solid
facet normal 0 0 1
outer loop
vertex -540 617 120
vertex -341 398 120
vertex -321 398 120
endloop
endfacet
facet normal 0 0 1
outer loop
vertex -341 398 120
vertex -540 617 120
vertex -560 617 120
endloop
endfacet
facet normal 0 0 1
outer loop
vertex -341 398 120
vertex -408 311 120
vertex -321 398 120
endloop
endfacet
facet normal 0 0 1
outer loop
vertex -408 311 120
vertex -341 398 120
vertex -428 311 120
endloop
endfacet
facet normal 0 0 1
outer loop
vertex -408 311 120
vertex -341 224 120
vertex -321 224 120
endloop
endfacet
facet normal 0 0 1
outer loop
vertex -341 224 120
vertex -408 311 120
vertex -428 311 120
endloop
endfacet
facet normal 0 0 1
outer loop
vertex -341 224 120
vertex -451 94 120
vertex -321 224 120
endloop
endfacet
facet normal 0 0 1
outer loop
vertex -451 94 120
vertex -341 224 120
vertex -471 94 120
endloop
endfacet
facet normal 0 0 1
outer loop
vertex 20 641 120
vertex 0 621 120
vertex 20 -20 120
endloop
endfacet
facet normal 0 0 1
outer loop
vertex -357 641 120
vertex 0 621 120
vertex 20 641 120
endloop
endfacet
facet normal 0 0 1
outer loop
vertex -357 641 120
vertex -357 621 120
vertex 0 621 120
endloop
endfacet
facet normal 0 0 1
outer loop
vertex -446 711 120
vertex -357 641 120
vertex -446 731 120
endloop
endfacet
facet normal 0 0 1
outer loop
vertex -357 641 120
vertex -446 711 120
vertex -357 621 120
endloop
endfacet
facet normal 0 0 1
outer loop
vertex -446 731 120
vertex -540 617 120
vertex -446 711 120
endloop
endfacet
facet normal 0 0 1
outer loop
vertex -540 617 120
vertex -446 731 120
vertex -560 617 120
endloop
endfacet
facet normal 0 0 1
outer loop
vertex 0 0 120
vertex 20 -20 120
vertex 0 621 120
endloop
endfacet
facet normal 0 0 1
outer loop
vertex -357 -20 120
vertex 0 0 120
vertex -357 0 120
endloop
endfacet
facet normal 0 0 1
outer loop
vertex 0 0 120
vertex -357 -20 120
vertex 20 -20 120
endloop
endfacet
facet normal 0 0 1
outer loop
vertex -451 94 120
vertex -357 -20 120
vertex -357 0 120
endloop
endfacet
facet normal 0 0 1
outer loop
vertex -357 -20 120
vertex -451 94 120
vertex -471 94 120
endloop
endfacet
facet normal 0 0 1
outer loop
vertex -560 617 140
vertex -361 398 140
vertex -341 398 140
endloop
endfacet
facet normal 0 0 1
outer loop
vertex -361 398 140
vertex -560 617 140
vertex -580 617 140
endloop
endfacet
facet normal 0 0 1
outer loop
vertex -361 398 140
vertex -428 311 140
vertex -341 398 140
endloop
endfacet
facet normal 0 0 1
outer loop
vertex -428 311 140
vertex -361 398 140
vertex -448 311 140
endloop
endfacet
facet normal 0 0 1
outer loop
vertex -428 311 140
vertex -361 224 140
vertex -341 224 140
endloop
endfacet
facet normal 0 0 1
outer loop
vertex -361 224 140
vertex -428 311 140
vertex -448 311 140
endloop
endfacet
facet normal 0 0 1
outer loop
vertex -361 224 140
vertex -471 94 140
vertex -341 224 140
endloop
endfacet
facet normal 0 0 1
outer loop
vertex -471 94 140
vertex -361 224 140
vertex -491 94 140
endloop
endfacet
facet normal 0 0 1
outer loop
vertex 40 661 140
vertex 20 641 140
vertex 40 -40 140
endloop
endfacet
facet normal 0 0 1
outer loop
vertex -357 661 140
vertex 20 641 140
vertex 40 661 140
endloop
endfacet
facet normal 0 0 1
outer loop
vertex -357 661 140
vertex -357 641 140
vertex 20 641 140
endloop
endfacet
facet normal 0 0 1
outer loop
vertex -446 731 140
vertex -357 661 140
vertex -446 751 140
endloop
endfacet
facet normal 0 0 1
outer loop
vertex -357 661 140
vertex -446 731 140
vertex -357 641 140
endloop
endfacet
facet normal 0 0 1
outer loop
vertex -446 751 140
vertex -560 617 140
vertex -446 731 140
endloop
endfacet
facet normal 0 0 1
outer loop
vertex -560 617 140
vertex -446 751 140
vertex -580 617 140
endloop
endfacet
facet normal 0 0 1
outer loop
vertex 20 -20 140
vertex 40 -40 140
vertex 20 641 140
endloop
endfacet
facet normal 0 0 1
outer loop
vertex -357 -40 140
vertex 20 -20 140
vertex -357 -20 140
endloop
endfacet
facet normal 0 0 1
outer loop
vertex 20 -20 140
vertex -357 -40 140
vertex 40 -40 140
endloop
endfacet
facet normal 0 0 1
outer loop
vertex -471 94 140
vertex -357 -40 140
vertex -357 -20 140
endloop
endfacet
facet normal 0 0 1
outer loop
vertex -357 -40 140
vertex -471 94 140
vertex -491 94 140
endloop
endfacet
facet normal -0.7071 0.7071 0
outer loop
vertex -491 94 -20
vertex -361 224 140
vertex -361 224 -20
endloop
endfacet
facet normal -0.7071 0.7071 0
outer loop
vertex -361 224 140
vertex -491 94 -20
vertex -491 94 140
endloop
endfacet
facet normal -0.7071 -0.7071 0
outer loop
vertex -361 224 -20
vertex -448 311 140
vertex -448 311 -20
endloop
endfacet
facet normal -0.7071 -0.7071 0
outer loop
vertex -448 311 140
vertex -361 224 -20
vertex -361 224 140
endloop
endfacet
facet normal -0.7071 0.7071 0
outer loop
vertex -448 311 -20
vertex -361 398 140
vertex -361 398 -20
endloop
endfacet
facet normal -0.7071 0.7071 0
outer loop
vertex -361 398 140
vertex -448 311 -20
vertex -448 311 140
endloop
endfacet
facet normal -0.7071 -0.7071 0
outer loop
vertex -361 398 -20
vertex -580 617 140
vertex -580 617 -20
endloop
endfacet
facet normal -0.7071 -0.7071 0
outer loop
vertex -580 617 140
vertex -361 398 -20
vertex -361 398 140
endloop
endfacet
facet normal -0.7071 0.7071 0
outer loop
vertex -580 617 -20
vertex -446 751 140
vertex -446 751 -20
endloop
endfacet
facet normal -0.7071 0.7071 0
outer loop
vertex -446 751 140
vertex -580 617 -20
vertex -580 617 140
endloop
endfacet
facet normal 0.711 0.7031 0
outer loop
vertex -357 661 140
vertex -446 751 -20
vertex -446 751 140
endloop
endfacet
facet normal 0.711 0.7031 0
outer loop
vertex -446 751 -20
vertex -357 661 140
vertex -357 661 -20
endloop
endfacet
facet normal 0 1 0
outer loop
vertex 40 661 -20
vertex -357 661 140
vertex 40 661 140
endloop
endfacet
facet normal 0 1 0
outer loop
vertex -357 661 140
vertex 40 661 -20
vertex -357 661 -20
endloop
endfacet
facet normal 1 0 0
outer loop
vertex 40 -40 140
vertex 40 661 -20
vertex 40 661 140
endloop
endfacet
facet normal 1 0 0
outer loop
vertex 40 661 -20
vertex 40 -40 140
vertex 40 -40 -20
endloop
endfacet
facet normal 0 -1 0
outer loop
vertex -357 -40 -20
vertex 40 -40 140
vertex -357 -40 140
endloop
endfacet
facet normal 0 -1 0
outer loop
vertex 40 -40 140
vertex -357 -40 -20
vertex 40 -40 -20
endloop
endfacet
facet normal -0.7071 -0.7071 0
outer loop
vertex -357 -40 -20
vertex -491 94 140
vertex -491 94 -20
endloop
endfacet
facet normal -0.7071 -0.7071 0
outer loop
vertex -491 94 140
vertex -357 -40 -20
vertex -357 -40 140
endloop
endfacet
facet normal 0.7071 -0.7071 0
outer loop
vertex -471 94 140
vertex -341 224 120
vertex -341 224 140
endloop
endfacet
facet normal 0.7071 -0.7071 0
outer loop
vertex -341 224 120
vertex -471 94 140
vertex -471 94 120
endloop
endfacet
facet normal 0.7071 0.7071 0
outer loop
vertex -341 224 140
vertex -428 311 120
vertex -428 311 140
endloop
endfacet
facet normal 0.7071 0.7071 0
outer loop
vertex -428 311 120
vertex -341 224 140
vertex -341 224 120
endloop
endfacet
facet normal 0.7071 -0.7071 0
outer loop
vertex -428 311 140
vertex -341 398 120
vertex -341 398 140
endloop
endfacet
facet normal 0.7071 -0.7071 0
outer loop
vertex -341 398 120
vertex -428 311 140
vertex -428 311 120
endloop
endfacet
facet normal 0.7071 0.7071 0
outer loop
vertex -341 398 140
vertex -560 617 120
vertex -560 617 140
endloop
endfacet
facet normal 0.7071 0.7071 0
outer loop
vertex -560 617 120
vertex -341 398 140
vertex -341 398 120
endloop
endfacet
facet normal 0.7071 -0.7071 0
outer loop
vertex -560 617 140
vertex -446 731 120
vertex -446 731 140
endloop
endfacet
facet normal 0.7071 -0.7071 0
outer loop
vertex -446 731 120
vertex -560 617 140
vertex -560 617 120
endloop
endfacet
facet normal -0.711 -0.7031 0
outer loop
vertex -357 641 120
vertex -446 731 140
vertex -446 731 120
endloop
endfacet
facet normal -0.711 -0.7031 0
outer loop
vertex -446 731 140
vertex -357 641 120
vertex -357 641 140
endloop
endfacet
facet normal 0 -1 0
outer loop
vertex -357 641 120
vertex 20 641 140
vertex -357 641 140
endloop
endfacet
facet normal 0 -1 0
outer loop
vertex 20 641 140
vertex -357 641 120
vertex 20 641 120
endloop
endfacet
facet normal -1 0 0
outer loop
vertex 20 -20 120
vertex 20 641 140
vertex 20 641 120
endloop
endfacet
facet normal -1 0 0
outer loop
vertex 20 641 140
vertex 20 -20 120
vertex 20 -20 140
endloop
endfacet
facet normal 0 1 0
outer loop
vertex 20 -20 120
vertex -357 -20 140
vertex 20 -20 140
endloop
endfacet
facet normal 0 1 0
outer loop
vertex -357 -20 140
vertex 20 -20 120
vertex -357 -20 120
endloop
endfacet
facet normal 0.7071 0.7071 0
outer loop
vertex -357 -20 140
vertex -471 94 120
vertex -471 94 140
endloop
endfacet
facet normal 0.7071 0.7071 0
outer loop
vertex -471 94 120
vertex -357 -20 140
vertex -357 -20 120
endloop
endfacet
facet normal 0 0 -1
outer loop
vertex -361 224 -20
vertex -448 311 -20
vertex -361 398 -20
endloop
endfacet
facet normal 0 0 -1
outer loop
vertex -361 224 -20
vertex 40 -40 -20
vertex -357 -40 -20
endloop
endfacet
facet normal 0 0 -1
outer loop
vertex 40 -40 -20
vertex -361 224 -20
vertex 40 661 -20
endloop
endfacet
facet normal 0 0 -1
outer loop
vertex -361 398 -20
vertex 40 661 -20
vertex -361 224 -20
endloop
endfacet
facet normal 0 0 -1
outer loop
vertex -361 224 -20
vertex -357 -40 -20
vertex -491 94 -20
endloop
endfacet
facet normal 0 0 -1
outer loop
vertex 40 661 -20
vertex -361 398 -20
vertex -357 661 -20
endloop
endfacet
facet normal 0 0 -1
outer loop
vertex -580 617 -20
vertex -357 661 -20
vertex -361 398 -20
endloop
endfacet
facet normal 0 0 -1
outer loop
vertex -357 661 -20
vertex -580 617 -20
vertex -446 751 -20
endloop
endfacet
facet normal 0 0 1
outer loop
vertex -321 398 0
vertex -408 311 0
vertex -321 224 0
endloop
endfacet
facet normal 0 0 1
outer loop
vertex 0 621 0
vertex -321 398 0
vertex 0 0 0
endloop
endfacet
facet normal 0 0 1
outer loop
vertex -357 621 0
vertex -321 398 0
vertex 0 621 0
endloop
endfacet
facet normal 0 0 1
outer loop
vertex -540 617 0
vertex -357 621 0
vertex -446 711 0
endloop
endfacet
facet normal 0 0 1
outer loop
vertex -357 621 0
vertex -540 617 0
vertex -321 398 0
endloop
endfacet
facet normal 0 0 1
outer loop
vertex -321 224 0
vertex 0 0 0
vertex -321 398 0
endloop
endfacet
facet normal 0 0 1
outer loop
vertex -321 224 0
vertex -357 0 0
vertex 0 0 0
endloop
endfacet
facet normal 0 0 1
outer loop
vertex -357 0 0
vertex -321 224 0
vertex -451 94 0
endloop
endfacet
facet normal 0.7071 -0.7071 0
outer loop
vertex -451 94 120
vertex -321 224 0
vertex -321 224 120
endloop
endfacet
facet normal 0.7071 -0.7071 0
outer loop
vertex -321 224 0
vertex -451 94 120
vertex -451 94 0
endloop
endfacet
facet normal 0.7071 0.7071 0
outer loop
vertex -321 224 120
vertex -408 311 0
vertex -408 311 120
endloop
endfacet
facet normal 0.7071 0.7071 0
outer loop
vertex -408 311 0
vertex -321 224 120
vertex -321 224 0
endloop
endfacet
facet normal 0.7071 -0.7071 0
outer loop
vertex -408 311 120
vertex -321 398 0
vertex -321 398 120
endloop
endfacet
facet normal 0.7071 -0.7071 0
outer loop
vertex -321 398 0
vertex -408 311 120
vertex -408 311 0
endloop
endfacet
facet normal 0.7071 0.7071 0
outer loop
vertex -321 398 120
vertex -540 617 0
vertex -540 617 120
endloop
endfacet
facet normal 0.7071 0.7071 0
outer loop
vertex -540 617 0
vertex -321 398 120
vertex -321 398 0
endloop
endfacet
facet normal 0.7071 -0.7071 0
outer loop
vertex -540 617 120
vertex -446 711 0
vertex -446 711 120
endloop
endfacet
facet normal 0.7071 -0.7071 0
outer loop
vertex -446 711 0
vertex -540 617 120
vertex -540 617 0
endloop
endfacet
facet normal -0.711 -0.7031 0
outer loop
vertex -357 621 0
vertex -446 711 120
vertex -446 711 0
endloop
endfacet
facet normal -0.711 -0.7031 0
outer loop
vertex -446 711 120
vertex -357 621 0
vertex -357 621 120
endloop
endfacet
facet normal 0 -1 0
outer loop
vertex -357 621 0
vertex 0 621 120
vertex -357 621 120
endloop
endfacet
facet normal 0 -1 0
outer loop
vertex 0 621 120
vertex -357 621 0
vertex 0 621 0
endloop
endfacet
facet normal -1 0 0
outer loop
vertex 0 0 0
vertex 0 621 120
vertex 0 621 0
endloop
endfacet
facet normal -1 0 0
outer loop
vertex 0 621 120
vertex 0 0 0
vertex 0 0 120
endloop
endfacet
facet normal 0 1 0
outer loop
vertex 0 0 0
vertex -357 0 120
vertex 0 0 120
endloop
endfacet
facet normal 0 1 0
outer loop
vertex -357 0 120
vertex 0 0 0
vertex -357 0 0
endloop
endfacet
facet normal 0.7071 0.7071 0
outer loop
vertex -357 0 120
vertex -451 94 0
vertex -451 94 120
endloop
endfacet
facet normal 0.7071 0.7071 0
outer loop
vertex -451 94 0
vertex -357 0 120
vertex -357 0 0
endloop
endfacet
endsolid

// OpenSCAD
w = 20;

mirror([1, 0, 0])
union()
{
	difference()
	{
		translate([0, 0, 100+w])
		linear_extrude(height = w, convexity = 10)
		{
			polygon(points = [[0-2*w, 0-2*w], [357, 0-2*w], [451+2*w, 94], [321+2*w, 224], [408+2*w, 311], [321+2*w, 398], [464+2*w, 541], [540+2*w, 617], [446, 711+2*w], [357, 621+2*w], [0-2*w, 621+2*w]]); 
		}//C
	
		translate([0, 0, 100+w-1])
		linear_extrude(height = w+2, convexity = 10)
		{
			polygon(points = [[0-w, 0-w], [357, 0-w], [451+w, 94], [321+w, 224], [408+w, 311], [321+w, 398], [464+w, 541], [540+w, 617], [446, 711+w], [357, 621+w], [0-w, 621+w]]); 
		} //B
	}
	difference()
	{

			translate([0,0,-w])
			linear_extrude(height = 100+2*w, convexity = 10)
			{
				polygon(points = [[0-2*w, 0-2*w], [357, 0-2*w], [451+2*w, 94], [321+2*w, 224], [408+2*w, 311], [321+2*w, 398], [464+2*w, 541], [540+2*w, 617], [446, 711+2*w], [357, 621+2*w], [0-2*w, 621+2*w]]); 
			}//C
			linear_extrude(height = 100+w+1, convexity = 10, twist = 0)
			{
				polygon(points = [[0, 0], [357, 0], [451, 94], [321, 224], [408, 311], [321, 398], [464, 541], [540, 617], [446, 711], [357, 621], [0, 621]]);
			}//A
	
		
		
	
	}
}


union()
{
	difference()
	{
		linear_extrude(height = 2*w, convexity = 10)
		{
		
			polygon([451+w, 94], [321+w, 224], [408+w, 311], [321+w, 398], [464+w, 541], [464+2*w, 541], [321+2*w, 398], [408+2*w, 311], [321+2*w, 224], [451+2*w, 94]); //X1
		}
		
		linear_extrude(height = 2*w, convexity = 10)
		{
			polygon([451, 94+w], [321+w, 224], [408+w, 311], [321+w, 398], [464, 541-w], [464+w, 541-w], [321+2*w, 398], [408+2*w, 311], [321+2*w, 224], [451+w, 94-w]); //Y1
		
		}
		
	}

	difference()
	{
	
		linear_extrude(height = w, convexity = 10)
		{
			polygon([-w, 94], [-w, 541], [-2*w, 541], [-2*w, 94]); //X2
		}
		
		linear_extrude(height = w, convexity = 10)
		{
			polygon([-w, 94+w], [-w, 541-w], [-2*w, 541-w], [-2*w, 94+w]); //Y2
		}
	}
}
